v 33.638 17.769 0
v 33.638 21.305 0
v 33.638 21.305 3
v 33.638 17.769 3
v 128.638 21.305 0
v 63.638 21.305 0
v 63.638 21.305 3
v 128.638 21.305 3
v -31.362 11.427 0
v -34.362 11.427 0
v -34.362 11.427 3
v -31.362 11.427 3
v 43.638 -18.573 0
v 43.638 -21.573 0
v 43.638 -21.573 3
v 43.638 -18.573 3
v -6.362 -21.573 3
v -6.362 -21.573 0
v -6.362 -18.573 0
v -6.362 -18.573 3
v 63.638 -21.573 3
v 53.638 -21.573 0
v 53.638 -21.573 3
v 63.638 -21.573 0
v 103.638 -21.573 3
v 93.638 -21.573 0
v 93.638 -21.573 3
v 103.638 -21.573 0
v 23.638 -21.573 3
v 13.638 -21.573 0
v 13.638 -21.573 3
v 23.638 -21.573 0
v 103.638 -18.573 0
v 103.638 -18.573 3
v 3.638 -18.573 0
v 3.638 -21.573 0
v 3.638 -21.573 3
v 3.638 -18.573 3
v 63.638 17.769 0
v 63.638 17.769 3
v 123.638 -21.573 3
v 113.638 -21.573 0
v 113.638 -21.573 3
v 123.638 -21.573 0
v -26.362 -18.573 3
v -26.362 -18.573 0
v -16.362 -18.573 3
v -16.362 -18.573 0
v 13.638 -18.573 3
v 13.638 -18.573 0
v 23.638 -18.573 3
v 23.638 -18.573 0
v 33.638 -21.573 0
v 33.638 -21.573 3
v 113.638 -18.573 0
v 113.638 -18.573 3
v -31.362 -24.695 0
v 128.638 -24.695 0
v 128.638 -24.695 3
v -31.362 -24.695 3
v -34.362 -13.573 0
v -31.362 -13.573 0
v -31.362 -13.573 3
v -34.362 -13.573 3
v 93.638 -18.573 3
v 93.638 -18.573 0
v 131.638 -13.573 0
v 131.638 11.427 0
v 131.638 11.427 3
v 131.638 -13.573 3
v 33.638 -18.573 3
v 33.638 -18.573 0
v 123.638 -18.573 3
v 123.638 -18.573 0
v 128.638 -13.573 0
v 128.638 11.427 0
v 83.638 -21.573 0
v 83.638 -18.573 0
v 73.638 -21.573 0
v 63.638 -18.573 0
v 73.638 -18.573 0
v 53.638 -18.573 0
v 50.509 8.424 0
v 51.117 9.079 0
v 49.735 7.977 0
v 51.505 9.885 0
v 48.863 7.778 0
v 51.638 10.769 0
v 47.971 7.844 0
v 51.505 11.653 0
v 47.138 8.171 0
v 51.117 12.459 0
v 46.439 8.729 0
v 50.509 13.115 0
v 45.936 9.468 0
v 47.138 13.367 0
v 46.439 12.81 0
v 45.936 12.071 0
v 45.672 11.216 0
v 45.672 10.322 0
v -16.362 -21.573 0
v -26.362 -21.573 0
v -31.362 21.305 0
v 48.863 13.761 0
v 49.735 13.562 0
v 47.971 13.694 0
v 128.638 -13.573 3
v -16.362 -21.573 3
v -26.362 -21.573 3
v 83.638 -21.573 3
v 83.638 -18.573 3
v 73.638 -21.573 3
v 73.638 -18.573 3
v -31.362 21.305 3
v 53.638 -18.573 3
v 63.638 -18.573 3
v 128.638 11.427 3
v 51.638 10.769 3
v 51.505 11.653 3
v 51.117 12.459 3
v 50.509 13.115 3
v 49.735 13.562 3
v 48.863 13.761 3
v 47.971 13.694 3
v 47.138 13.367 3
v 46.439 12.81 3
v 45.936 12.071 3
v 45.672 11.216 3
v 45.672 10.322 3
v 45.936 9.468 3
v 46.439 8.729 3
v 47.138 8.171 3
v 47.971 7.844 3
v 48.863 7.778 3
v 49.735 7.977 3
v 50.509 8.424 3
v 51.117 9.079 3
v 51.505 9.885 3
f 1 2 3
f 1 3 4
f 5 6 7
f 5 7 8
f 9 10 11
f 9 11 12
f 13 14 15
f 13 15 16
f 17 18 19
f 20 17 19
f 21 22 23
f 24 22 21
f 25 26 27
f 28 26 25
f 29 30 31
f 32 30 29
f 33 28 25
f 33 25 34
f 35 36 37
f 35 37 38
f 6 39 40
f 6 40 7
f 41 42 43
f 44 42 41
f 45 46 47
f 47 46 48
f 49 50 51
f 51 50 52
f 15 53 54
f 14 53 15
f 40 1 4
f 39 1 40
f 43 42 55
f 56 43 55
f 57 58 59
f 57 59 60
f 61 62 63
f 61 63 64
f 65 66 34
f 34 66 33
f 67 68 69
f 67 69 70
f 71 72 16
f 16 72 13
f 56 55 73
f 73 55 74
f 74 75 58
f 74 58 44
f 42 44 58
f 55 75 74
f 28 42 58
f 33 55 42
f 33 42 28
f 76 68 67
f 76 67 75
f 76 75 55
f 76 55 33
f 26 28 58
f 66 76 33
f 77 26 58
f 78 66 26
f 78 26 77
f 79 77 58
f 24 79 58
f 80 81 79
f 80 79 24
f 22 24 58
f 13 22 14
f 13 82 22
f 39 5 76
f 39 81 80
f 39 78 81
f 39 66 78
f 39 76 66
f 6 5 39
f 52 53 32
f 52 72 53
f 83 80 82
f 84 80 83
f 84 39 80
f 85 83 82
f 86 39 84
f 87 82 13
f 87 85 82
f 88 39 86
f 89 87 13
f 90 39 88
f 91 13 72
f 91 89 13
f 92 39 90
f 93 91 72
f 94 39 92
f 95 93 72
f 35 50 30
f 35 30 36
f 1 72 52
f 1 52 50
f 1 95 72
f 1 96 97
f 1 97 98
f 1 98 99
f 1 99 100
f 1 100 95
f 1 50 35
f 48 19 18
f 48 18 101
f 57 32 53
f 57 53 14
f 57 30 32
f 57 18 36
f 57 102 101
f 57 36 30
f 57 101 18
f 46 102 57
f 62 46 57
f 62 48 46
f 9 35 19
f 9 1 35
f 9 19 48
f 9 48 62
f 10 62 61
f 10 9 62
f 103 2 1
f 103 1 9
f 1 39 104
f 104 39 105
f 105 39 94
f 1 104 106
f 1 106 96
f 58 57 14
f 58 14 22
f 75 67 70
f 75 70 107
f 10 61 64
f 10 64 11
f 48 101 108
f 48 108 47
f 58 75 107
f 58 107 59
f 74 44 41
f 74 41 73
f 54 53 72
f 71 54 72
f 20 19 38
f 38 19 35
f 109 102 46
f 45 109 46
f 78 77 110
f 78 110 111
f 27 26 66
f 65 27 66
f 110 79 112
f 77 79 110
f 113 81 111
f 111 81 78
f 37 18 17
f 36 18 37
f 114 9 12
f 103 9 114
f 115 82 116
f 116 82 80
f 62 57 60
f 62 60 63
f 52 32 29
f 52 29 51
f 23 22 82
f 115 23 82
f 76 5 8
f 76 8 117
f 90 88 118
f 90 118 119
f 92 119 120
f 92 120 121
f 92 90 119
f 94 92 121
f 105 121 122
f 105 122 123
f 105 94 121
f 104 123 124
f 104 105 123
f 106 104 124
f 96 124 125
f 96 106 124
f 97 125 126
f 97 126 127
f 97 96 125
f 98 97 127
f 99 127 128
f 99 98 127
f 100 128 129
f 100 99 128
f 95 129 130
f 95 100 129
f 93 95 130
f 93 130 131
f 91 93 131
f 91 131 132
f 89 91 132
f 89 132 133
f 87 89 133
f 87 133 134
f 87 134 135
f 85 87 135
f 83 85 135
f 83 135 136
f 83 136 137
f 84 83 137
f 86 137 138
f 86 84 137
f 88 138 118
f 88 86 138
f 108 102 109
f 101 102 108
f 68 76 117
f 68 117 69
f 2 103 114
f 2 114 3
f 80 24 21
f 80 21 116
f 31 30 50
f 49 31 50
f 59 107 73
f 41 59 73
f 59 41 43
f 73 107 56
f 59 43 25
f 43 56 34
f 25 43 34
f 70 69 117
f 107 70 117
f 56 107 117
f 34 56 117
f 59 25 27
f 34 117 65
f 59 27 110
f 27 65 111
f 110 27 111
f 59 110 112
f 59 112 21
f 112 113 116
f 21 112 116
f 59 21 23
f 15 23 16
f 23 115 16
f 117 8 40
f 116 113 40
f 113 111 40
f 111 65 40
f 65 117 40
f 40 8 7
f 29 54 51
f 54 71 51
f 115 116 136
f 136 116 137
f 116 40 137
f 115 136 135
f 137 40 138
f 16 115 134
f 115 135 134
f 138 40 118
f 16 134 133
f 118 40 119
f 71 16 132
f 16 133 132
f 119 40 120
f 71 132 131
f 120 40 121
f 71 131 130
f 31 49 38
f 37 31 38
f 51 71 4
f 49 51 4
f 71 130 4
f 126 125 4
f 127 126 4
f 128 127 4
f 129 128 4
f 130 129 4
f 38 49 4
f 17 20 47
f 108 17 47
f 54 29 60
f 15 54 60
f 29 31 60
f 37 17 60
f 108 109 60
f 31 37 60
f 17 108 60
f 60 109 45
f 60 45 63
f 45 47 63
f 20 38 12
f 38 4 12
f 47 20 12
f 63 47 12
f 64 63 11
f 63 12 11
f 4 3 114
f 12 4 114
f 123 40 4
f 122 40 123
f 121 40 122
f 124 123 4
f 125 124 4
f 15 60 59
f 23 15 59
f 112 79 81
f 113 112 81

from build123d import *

# Parameters (mm, degrees)
SKETCH1_R           = 3
SKETCH1_W           = 10
SKETCH1_H           = 3
BOSS_EXTRUDE1_DEPTH = 3


with BuildPart() as part:
    # Sketch1 → Boss-Extrude1 (new body)
    with BuildSketch(Plane.XY):
        Polygon((-31.361502347, 21.305164319), (33.638497653, 21.305164319), (33.638497653, 17.769219388), (63.638497653, 17.769219388), (63.638497653, 21.305164319), (128.638497653, 21.305164319), (128.638497653, 11.427031749), (131.638497653, 11.427031749), (131.638497653, -13.572968251), (128.638497653, -13.572968251), (128.638497653, -24.694835681), (-31.361502347, -24.694835681), (-31.361502347, -13.572968251), (-34.361502347, -13.572968251), (-34.361502347, 11.427031749), (-31.361502347, 11.427031749), align=None)
        with Locations((48.638497653, 10.769219388)):
            Circle(SKETCH1_R, mode=Mode.SUBTRACT)
        with Locations((-1.361502347, -20.072968251)):
            Rectangle(SKETCH1_W, SKETCH1_H, mode=Mode.SUBTRACT)
        with Locations((-21.361502347, -20.072968251)):
            Rectangle(SKETCH1_W, SKETCH1_H, mode=Mode.SUBTRACT)
        with Locations((18.638497653, -20.072968251)):
            Rectangle(SKETCH1_W, SKETCH1_H, mode=Mode.SUBTRACT)
        with Locations((38.638497653, -20.072968251)):
            Rectangle(SKETCH1_W, SKETCH1_H, mode=Mode.SUBTRACT)
        with Locations((58.638497653, -20.072968251)):
            Rectangle(SKETCH1_W, SKETCH1_H, mode=Mode.SUBTRACT)
        with Locations((78.638497653, -20.072968251)):
            Rectangle(SKETCH1_W, SKETCH1_H, mode=Mode.SUBTRACT)
        with Locations((98.638497653, -20.072968251)):
            Rectangle(SKETCH1_W, SKETCH1_H, mode=Mode.SUBTRACT)
        with Locations((118.638497653, -20.072968251)):
            Rectangle(SKETCH1_W, SKETCH1_H, mode=Mode.SUBTRACT)
    extrude(amount=BOSS_EXTRUDE1_DEPTH)


solid = part.part
